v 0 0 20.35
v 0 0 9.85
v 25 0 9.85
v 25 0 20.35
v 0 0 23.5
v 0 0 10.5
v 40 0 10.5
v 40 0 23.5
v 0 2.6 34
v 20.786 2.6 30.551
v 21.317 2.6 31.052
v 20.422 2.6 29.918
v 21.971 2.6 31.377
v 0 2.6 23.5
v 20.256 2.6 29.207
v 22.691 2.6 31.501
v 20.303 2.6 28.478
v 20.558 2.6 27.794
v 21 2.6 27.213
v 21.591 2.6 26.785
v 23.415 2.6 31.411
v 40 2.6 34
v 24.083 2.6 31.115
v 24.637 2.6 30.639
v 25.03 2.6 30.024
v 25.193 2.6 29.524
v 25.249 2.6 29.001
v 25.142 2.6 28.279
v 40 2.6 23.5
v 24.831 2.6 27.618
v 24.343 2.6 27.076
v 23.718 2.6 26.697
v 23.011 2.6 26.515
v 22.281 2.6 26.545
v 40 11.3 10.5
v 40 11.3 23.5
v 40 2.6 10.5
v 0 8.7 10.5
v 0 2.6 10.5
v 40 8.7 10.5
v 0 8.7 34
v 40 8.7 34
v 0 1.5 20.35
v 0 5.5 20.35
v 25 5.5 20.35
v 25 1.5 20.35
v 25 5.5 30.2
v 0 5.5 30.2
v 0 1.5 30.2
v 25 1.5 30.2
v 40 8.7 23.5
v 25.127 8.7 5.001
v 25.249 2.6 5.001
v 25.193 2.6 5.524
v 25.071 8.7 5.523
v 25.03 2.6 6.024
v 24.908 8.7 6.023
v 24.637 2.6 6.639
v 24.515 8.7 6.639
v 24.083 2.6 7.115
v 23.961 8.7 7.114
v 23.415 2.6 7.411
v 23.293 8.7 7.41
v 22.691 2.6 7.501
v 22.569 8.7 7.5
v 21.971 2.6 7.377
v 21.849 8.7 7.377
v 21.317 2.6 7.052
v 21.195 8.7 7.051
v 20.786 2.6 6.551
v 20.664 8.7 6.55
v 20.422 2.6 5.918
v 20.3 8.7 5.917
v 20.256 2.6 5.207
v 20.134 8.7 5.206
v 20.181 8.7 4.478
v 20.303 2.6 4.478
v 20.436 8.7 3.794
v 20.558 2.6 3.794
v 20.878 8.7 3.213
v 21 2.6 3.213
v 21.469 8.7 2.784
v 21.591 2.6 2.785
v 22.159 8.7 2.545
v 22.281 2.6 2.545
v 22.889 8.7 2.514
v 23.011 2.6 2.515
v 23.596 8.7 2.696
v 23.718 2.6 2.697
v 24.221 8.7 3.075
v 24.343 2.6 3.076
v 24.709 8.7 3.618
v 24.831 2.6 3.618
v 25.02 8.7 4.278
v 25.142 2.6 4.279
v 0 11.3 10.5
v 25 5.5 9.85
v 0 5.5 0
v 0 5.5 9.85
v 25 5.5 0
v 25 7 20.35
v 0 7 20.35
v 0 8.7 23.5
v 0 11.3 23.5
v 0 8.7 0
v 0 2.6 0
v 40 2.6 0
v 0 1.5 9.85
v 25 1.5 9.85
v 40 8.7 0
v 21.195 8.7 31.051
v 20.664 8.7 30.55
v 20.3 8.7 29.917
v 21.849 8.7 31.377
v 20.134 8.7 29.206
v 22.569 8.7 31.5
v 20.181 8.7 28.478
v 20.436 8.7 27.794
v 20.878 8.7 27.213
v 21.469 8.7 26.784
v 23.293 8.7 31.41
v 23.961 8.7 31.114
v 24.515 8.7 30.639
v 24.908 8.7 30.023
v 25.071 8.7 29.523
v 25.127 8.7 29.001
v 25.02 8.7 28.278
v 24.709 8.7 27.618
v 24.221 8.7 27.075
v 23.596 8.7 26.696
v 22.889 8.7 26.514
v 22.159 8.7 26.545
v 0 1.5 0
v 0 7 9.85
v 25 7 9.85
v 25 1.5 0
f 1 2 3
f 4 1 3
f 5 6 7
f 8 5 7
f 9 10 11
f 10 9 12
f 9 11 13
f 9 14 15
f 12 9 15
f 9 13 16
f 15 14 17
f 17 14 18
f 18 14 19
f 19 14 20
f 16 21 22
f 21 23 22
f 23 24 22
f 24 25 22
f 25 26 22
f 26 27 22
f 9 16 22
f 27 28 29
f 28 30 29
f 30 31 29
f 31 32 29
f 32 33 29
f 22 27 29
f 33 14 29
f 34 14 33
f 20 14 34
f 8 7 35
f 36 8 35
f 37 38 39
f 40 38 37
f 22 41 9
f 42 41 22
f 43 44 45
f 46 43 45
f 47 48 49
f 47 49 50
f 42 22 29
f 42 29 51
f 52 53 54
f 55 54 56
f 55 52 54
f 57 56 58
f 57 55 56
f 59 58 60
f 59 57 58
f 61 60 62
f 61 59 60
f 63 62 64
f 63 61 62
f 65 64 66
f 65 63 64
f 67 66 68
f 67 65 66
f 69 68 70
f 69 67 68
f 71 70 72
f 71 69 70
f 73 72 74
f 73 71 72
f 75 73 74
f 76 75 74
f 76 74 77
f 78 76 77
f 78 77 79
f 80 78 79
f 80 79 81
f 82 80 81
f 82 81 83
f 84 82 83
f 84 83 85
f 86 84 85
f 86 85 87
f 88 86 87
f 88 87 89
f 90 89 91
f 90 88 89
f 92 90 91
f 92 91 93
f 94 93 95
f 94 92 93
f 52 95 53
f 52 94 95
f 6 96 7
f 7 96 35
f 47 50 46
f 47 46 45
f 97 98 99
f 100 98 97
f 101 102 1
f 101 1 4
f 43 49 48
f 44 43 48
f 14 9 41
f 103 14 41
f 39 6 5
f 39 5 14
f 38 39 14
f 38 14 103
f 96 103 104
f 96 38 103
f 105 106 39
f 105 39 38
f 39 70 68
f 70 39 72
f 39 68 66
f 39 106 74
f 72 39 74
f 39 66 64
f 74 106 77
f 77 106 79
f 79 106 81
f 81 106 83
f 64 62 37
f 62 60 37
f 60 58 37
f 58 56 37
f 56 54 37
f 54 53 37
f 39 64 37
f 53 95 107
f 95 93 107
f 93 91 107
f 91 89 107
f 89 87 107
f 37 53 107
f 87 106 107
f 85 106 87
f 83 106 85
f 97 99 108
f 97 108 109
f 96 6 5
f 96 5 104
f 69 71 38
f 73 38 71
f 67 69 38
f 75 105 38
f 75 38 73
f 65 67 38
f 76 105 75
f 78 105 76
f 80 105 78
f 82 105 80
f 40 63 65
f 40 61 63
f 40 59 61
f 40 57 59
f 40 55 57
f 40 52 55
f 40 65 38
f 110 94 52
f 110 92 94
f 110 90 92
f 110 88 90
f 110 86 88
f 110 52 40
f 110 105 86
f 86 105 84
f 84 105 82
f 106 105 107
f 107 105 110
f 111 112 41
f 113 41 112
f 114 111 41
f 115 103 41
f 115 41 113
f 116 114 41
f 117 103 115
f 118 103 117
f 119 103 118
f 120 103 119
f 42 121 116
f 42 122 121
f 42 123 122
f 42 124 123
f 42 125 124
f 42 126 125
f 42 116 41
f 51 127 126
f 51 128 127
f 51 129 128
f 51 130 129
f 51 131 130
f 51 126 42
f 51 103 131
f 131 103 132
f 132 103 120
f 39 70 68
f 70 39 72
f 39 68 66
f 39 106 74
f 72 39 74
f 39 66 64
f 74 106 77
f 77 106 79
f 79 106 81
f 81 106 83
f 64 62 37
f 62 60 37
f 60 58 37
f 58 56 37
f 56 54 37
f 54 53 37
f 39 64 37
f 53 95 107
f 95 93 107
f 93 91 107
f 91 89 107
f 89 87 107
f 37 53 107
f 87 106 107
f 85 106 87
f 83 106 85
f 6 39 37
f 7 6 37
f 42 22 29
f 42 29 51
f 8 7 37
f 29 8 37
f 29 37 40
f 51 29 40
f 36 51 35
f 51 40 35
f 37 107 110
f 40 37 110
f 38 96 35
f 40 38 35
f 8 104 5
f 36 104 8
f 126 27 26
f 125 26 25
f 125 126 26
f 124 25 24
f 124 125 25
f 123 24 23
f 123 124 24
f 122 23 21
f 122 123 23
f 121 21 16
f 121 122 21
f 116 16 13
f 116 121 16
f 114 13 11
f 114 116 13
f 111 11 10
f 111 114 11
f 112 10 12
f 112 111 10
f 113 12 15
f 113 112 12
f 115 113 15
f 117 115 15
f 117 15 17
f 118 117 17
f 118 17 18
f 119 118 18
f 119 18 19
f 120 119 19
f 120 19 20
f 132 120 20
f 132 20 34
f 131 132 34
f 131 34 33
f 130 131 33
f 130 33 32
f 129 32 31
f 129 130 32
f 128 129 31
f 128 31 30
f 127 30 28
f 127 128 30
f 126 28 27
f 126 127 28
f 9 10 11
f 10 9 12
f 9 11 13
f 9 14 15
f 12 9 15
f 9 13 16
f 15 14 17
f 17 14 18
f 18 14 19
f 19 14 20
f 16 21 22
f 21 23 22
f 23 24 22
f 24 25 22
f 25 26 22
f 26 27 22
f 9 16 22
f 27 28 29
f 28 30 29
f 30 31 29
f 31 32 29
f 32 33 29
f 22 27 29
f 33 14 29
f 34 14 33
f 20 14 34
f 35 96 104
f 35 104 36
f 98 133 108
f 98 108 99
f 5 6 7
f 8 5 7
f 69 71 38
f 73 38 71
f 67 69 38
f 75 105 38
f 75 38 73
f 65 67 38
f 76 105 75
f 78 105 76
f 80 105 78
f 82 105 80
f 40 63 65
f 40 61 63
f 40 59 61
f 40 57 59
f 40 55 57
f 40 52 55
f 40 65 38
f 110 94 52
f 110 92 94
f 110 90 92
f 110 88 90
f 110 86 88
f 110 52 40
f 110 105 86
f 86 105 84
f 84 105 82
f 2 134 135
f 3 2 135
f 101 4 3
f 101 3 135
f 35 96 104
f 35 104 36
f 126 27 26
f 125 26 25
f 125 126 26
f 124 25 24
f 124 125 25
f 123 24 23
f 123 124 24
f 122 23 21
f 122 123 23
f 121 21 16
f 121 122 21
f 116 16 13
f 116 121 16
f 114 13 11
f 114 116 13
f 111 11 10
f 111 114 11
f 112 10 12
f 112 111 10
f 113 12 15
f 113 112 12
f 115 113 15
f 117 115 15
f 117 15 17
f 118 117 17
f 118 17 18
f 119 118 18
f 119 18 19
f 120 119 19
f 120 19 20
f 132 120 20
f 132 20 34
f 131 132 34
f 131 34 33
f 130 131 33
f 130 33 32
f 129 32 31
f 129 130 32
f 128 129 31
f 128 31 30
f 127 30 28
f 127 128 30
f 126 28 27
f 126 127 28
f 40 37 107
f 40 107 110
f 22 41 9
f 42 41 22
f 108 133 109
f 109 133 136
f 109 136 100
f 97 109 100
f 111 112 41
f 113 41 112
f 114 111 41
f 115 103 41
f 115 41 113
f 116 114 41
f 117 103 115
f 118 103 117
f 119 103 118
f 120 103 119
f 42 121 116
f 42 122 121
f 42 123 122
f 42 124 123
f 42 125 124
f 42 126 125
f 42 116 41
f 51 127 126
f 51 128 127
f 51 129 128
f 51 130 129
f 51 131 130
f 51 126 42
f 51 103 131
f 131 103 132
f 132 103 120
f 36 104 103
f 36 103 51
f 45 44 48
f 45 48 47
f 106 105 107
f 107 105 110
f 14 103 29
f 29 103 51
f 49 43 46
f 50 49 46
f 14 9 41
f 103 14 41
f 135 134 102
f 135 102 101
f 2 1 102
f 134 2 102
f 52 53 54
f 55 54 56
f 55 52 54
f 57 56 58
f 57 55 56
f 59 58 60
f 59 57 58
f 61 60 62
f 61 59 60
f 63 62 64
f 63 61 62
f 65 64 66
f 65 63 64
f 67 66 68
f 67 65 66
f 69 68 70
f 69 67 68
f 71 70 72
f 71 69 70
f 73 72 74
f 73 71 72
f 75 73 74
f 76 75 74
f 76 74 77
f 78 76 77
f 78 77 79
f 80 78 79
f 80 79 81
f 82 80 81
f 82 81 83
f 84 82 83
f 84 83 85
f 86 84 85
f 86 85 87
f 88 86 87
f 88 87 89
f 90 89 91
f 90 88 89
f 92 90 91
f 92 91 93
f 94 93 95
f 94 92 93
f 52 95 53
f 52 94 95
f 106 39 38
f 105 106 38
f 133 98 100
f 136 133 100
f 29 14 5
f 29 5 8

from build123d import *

# Parameters (mm, degrees)
BOX_W                       = 40
BOX_H                       = 11.3
BOX_DEPTH                   = 13
CYLINDER001_R               = 2.5
CYLINDER001_DEPTH           = 20
CYLINDER001_ROLL_ANGLE      = 89.994272
CYLINDER001_PITCH_ANGLE     = 5.7e-05
CYLINDER001_PLACEMENT_ANGLE = 1.14582
BOX002_W                    = 40
BOX002_H                    = 6.1
BOX002_DEPTH                = 10.5
CYLINDER_R                  = 2.5
CYLINDER_DEPTH              = 20
CYLINDER_ROLL_ANGLE         = 89.994272
CYLINDER_PITCH_ANGLE        = 5.7e-05
CYLINDER_PLACEMENT_ANGLE    = 1.14582
BOX001_W                    = 40
BOX001_H                    = 6.1
BOX001_DEPTH                = 10.5
BOX003_W                    = 40
BOX003_H                    = 11.3
BOX003_DEPTH                = 13
CYLINDER002_R               = 2.5
CYLINDER002_DEPTH           = 20
CYLINDER002_ROLL_ANGLE      = 89.994272
CYLINDER002_PITCH_ANGLE     = 5.7e-05
CYLINDER002_PLACEMENT_ANGLE = 1.14582
BOX004_W                    = 40
BOX004_H                    = 6.1
BOX004_DEPTH                = 10.5
CYLINDER003_R               = 2.5
CYLINDER003_DEPTH           = 20
CYLINDER003_ROLL_ANGLE      = 89.994272
CYLINDER003_PITCH_ANGLE     = 5.7e-05
CYLINDER003_PLACEMENT_ANGLE = 1.14582
BOX005_W                    = 40
BOX005_H                    = 6.1
BOX005_DEPTH                = 10.5
BOX006_W                    = 25
BOX006_H                    = 7
BOX006_DEPTH                = 10.5
BOX007_W                    = 25
BOX007_H                    = 4
BOX007_DEPTH                = 9.85
BOX008_W                    = 25
BOX008_H                    = 4
BOX008_DEPTH                = 9.85


with BuildPart() as cube:
    # Box → Box (new body)
    with BuildSketch(Plane.XY.offset(10.5)):
        with Locations((20, 5.65)):
            Rectangle(BOX_W, BOX_H)
    extrude(amount=BOX_DEPTH)


with BuildPart() as cylinder001:
    # Cylinder001 → Cylinder001 (new body)
    with BuildSketch(Plane.XY):
        Circle(CYLINDER001_R)
    extrude(amount=CYLINDER001_DEPTH)


with BuildPart() as cylinder001_1:
    # Cylinder001 roll: moved
    add(cylinder001.part.rotate(Axis((0, 0, 0), (1, 0, 0)), CYLINDER001_ROLL_ANGLE))


with BuildPart() as cylinder001_2:
    # Cylinder001 pitch: moved
    add(cylinder001_1.part.rotate(Axis((0, 0, 0), (0, 1, 0)), CYLINDER001_PITCH_ANGLE))


with BuildPart() as cylinder001_3:
    # Cylinder001 placement: moved
    add(cylinder001_2.part.moved(Location((22.5, 15, 5))).rotate(Axis((22.5, 15, 5), (0, 0, 1)), CYLINDER001_PLACEMENT_ANGLE))


with BuildPart() as cut001:
    # Box002 → Box002 (new body)
    with BuildSketch(Plane(origin=(0, 2.6, 0), x_dir=(1, 0, 0), z_dir=(0, 0, 1))):
        with Locations((20, 3.05)):
            Rectangle(BOX002_W, BOX002_H)
    extrude(amount=BOX002_DEPTH)

    # Cut001: cut Cylinder001
    add(cylinder001_3.part, mode=Mode.SUBTRACT)


with BuildPart() as cylinder:
    # Cylinder → Cylinder (new body)
    with BuildSketch(Plane.XY):
        Circle(CYLINDER_R)
    extrude(amount=CYLINDER_DEPTH)


with BuildPart() as cylinder_1:
    # Cylinder roll: moved
    add(cylinder.part.rotate(Axis((0, 0, 0), (1, 0, 0)), CYLINDER_ROLL_ANGLE))


with BuildPart() as cylinder_2:
    # Cylinder pitch: moved
    add(cylinder_1.part.rotate(Axis((0, 0, 0), (0, 1, 0)), CYLINDER_PITCH_ANGLE))


with BuildPart() as cylinder_3:
    # Cylinder placement: moved
    add(cylinder_2.part.moved(Location((22.5, 15, 29))).rotate(Axis((22.5, 15, 29), (0, 0, 1)), CYLINDER_PLACEMENT_ANGLE))


with BuildPart() as fusion:
    # Box001 → Box001 (new body)
    with BuildSketch(Plane(origin=(0, 2.6, 23.5), x_dir=(1, 0, 0), z_dir=(0, 0, 1))):
        with Locations((20, 3.05)):
            Rectangle(BOX001_W, BOX001_H)
    extrude(amount=BOX001_DEPTH)

    # Cut: cut Cylinder
    add(cylinder_3.part, mode=Mode.SUBTRACT)

    # Fusion: union Cube, Cut001
    add(cube.part)
    add(cut001.part)


with BuildPart() as cube003:
    # Box003 → Box003 (new body)
    with BuildSketch(Plane.XY.offset(10.5)):
        with Locations((20, 5.65)):
            Rectangle(BOX003_W, BOX003_H)
    extrude(amount=BOX003_DEPTH)


with BuildPart() as cylinder002:
    # Cylinder002 → Cylinder002 (new body)
    with BuildSketch(Plane.XY):
        Circle(CYLINDER002_R)
    extrude(amount=CYLINDER002_DEPTH)


with BuildPart() as cylinder002_1:
    # Cylinder002 roll: moved
    add(cylinder002.part.rotate(Axis((0, 0, 0), (1, 0, 0)), CYLINDER002_ROLL_ANGLE))


with BuildPart() as cylinder002_2:
    # Cylinder002 pitch: moved
    add(cylinder002_1.part.rotate(Axis((0, 0, 0), (0, 1, 0)), CYLINDER002_PITCH_ANGLE))


with BuildPart() as cylinder002_3:
    # Cylinder002 placement: moved
    add(cylinder002_2.part.moved(Location((22.5, 15, 29))).rotate(Axis((22.5, 15, 29), (0, 0, 1)), CYLINDER002_PLACEMENT_ANGLE))


with BuildPart() as cut002:
    # Box004 → Box004 (new body)
    with BuildSketch(Plane(origin=(0, 2.6, 23.5), x_dir=(1, 0, 0), z_dir=(0, 0, 1))):
        with Locations((20, 3.05)):
            Rectangle(BOX004_W, BOX004_H)
    extrude(amount=BOX004_DEPTH)

    # Cut002: cut Cylinder002
    add(cylinder002_3.part, mode=Mode.SUBTRACT)


with BuildPart() as cylinder003:
    # Cylinder003 → Cylinder003 (new body)
    with BuildSketch(Plane.XY):
        Circle(CYLINDER003_R)
    extrude(amount=CYLINDER003_DEPTH)


with BuildPart() as cylinder003_1:
    # Cylinder003 roll: moved
    add(cylinder003.part.rotate(Axis((0, 0, 0), (1, 0, 0)), CYLINDER003_ROLL_ANGLE))


with BuildPart() as cylinder003_2:
    # Cylinder003 pitch: moved
    add(cylinder003_1.part.rotate(Axis((0, 0, 0), (0, 1, 0)), CYLINDER003_PITCH_ANGLE))


with BuildPart() as cylinder003_3:
    # Cylinder003 placement: moved
    add(cylinder003_2.part.moved(Location((22.5, 15, 5))).rotate(Axis((22.5, 15, 5), (0, 0, 1)), CYLINDER003_PLACEMENT_ANGLE))


with BuildPart() as cut003:
    # Box005 → Box005 (new body)
    with BuildSketch(Plane(origin=(0, 2.6, 0), x_dir=(1, 0, 0), z_dir=(0, 0, 1))):
        with Locations((20, 3.05)):
            Rectangle(BOX005_W, BOX005_H)
    extrude(amount=BOX005_DEPTH)

    # Cut003: cut Cylinder003
    add(cylinder003_3.part, mode=Mode.SUBTRACT)


with BuildPart() as cube006:
    # Box006 → Box006 (new body)
    with BuildSketch(Plane.XY.offset(9.85)):
        with Locations((12.5, 3.5)):
            Rectangle(BOX006_W, BOX006_H)
    extrude(amount=BOX006_DEPTH)


with BuildPart() as cube007:
    # Box007 → Box007 (new body)
    with BuildSketch(Plane(origin=(0, 1.5, 20.35), x_dir=(1, 0, 0), z_dir=(0, 0, 1))):
        with Locations((12.5, 2)):
            Rectangle(BOX007_W, BOX007_H)
    extrude(amount=BOX007_DEPTH)


with BuildPart() as cube008:
    # Box008 → Box008 (new body)
    with BuildSketch(Plane(origin=(0, 1.5, 0), x_dir=(1, 0, 0), z_dir=(0, 0, 1))):
        with Locations((12.5, 2)):
            Rectangle(BOX008_W, BOX008_H)
    extrude(amount=BOX008_DEPTH)


solid = Compound([fusion.part, cube003.part, cut002.part, cut003.part, cube006.part, cube007.part, cube008.part])
